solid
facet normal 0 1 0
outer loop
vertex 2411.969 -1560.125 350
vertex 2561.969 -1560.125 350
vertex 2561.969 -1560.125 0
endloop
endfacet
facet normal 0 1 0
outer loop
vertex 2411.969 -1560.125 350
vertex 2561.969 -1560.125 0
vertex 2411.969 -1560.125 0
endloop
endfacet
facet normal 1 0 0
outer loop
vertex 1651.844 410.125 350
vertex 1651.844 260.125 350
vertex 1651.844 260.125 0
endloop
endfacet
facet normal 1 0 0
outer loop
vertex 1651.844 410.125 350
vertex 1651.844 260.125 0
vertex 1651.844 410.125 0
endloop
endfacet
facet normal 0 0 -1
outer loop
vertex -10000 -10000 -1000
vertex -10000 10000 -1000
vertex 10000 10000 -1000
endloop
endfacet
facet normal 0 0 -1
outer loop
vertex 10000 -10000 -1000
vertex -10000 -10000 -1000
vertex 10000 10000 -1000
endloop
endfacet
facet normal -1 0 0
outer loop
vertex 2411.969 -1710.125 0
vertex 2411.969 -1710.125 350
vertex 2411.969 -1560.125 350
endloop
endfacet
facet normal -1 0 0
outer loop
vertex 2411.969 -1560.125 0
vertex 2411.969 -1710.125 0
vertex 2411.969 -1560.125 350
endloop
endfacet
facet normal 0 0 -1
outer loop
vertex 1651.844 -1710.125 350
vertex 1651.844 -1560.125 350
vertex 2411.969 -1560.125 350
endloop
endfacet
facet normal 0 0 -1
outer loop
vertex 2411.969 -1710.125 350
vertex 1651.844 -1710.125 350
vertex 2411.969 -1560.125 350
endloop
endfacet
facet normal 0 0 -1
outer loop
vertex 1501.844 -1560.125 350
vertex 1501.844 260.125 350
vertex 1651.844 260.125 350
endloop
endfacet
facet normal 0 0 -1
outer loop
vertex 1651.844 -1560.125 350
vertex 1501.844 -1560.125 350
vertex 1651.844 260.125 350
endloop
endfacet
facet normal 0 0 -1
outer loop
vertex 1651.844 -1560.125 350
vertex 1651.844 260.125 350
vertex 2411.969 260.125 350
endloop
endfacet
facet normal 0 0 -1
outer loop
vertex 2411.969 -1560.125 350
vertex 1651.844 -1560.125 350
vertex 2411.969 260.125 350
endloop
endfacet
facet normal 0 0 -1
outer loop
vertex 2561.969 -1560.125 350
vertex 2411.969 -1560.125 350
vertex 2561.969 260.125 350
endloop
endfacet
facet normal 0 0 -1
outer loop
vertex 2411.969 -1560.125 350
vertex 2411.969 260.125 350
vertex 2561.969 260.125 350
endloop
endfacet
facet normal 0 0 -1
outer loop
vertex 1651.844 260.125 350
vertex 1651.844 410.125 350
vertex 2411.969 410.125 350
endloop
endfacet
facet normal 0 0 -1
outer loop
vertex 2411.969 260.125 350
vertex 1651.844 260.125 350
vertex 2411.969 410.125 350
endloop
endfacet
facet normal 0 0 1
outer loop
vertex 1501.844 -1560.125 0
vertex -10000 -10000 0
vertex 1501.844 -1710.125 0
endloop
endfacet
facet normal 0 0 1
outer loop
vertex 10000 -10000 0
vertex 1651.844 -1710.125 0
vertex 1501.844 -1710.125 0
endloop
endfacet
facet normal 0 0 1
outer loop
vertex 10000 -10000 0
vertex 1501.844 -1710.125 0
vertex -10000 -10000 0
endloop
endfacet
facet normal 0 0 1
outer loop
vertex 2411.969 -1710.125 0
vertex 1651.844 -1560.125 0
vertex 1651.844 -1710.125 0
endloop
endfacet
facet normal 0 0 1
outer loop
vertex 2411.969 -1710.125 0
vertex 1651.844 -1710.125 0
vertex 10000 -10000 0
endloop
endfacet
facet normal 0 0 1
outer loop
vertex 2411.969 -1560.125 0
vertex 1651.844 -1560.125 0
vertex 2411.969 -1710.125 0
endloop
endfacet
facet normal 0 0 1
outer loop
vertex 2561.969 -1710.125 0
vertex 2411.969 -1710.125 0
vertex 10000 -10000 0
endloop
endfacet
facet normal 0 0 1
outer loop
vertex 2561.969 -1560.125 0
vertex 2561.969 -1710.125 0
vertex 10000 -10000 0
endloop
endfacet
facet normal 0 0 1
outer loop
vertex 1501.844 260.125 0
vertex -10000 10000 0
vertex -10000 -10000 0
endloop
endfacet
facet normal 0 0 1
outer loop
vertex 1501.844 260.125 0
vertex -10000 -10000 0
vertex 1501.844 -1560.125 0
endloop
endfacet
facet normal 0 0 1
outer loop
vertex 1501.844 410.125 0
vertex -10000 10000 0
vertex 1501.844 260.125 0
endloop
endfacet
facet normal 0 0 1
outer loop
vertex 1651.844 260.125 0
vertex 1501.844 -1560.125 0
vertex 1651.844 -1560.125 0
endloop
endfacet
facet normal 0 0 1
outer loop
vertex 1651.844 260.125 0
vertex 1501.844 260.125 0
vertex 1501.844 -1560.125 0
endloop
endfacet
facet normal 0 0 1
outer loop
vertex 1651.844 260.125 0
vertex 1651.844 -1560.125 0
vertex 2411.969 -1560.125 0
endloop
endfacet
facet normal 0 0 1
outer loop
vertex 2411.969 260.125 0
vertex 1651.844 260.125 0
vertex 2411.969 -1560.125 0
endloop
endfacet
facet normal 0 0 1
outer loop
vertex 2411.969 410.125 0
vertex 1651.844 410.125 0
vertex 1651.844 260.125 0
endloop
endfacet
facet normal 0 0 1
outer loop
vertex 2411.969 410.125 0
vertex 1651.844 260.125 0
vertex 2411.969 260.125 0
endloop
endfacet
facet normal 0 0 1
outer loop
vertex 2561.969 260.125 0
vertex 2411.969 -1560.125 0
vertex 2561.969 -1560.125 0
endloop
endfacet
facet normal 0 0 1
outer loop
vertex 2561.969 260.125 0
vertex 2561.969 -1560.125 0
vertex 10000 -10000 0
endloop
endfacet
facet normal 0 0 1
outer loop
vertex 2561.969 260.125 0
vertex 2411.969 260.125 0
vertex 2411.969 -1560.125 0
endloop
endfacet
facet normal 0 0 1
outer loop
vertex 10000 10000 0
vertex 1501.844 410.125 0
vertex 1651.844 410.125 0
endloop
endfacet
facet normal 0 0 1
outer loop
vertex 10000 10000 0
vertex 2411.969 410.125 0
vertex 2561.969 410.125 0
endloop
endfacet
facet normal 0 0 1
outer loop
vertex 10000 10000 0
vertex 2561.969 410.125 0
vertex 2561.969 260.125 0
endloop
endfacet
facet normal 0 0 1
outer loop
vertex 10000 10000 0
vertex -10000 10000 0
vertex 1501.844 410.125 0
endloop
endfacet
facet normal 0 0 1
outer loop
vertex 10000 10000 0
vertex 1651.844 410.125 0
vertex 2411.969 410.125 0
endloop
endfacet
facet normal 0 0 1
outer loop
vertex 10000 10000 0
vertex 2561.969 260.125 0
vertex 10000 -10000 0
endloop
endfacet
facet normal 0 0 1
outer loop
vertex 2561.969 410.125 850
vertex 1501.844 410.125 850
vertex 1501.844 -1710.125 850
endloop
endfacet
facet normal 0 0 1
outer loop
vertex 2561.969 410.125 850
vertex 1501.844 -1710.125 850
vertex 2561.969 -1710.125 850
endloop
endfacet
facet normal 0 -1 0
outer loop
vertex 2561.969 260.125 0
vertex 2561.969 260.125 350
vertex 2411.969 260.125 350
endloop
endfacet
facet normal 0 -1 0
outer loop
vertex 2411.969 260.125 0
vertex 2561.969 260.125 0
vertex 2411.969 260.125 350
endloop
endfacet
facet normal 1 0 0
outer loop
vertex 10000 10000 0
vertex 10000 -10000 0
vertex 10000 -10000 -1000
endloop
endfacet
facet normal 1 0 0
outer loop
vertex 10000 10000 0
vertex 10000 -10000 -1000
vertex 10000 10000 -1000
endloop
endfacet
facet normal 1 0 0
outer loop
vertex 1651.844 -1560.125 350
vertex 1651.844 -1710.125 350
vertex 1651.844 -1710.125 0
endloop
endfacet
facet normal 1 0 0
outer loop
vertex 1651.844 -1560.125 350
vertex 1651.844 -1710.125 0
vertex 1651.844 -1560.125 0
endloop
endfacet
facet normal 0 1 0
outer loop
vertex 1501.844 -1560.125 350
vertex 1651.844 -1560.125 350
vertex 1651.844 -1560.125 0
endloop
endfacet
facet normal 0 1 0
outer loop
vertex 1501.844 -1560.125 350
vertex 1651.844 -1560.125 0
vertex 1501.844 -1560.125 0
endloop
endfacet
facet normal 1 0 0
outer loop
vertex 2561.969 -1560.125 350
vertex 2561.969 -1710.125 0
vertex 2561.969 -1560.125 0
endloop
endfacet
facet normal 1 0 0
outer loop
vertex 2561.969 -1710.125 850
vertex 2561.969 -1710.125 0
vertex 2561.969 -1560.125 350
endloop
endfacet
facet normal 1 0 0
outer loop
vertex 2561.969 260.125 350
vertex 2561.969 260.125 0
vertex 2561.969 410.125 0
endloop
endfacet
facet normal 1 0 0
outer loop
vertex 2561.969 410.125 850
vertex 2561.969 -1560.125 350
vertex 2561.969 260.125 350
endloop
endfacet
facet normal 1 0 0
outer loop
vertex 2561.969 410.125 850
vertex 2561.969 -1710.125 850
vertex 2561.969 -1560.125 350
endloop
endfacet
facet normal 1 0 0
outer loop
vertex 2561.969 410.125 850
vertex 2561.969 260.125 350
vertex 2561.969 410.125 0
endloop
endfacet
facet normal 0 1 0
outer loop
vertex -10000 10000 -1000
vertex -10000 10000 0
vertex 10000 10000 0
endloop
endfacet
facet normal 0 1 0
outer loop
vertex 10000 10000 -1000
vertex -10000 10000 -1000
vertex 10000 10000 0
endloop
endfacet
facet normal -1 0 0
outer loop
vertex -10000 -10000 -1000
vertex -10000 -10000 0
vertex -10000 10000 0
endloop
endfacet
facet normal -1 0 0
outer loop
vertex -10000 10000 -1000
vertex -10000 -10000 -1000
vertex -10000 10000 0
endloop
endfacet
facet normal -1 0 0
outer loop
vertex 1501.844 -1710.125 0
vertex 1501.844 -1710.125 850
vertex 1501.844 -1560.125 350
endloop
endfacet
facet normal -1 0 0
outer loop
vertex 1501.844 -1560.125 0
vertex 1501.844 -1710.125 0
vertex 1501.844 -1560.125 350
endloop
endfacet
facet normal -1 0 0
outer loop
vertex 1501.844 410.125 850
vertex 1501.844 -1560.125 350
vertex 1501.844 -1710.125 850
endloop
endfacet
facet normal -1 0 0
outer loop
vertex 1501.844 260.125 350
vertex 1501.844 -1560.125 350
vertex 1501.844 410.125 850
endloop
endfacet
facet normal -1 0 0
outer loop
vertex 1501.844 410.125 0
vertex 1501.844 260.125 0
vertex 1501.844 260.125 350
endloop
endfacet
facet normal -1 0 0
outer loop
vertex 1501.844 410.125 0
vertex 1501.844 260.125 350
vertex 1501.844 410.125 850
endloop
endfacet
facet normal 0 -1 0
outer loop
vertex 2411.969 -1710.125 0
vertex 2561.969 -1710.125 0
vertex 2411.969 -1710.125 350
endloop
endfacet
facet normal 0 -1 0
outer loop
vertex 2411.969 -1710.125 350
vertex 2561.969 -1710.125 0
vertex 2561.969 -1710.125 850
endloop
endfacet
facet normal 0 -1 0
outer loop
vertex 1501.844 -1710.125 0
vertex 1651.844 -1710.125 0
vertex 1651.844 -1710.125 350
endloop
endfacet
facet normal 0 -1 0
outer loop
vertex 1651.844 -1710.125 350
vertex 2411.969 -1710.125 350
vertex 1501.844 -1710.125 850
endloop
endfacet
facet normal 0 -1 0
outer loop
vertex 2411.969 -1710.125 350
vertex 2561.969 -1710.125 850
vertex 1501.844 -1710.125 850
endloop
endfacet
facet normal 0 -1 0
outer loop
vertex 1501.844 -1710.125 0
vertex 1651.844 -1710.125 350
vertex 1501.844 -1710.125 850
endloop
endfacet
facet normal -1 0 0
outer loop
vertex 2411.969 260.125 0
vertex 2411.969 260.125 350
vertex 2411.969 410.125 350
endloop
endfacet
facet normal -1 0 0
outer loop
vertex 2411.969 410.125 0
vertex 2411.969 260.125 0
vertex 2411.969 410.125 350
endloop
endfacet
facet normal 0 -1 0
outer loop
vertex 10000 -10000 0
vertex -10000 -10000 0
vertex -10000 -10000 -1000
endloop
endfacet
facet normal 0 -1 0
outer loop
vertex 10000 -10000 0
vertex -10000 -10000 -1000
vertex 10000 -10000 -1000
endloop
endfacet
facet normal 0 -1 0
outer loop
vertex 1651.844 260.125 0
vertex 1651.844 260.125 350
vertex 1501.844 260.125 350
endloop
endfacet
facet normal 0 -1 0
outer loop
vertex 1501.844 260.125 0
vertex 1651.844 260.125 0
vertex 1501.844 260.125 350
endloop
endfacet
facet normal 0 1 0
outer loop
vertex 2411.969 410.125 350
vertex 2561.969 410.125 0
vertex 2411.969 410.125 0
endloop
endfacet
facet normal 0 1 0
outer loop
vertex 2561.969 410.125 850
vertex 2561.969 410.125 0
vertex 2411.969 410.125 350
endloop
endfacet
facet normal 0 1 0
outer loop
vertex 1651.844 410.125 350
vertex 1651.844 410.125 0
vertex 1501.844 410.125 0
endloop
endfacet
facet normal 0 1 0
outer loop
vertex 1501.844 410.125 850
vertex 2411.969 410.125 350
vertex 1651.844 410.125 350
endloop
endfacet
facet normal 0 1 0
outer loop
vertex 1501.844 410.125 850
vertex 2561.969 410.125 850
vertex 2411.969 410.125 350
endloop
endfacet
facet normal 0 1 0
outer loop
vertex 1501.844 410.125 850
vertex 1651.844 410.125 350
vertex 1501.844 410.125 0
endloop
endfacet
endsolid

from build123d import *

# Parameters (mm, degrees)
SKETCH2_W           = 20000
SKETCH2_H           = 20000
BOSS_EXTRUDE1_DEPTH = 1000
SKETCH6_W           = 1060.125212232
SKETCH6_H           = 2120.250424464
BOSS_EXTRUDE2_DEPTH = 500
BOSS_EXTRUDE3_REACH = 14208.425
SKETCH7_W           = 150
SKETCH7_H           = 150


with BuildPart() as part:
    # Sketch2 → Boss-Extrude1 (new body)
    with BuildSketch(Plane.XY):
        Rectangle(SKETCH2_W, SKETCH2_H)
    extrude(amount=-BOSS_EXTRUDE1_DEPTH)

    # Sketch7 → Boss-Extrude3 (add, up to next)
    with BuildSketch(Plane(origin=(0, 0, 350), x_dir=(-1, 0, 0), z_dir=(0, 0, -1)), mode=Mode.PRIVATE) as boss_extrude3_sk1:
        with Locations((-2486.969262894, 335.125212232)):
            Rectangle(SKETCH7_W, SKETCH7_H)
    boss_extrude3_tool1 = extrude(boss_extrude3_sk1.sketch, amount=BOSS_EXTRUDE3_REACH, mode=Mode.PRIVATE) - part.part
    # Sketch7 → Boss-Extrude3 (add, up to next)
    with BuildSketch(Plane(origin=(0, 0, 350), x_dir=(-1, 0, 0), z_dir=(0, 0, -1)), mode=Mode.PRIVATE) as boss_extrude3_sk2:
        with Locations((-1576.844050662, 335.125212232)):
            Rectangle(SKETCH7_W, SKETCH7_H)
    boss_extrude3_tool2 = extrude(boss_extrude3_sk2.sketch, amount=BOSS_EXTRUDE3_REACH, mode=Mode.PRIVATE) - part.part
    # Sketch7 → Boss-Extrude3 (add, up to next)
    with BuildSketch(Plane(origin=(0, 0, 350), x_dir=(-1, 0, 0), z_dir=(0, 0, -1)), mode=Mode.PRIVATE) as boss_extrude3_sk3:
        with Locations((-2486.969262894, -1635.125212232)):
            Rectangle(SKETCH7_W, SKETCH7_H)
    boss_extrude3_tool3 = extrude(boss_extrude3_sk3.sketch, amount=BOSS_EXTRUDE3_REACH, mode=Mode.PRIVATE) - part.part
    # Sketch7 → Boss-Extrude3 (add, up to next)
    with BuildSketch(Plane(origin=(0, 0, 350), x_dir=(-1, 0, 0), z_dir=(0, 0, -1)), mode=Mode.PRIVATE) as boss_extrude3_sk4:
        with Locations((-1576.844050662, -1635.125212232)):
            Rectangle(SKETCH7_W, SKETCH7_H)
    boss_extrude3_tool4 = extrude(boss_extrude3_sk4.sketch, amount=BOSS_EXTRUDE3_REACH, mode=Mode.PRIVATE) - part.part


with BuildPart() as body_2:
    # Sketch6 → Boss-Extrude2 (new body)
    with BuildSketch(Plane(origin=(0, -650, 350), x_dir=(1, 0, 0), z_dir=(0, 0, 1))):
        with Locations((2031.906656778, 0)):
            Rectangle(SKETCH6_W, SKETCH6_H)
    extrude(amount=BOSS_EXTRUDE2_DEPTH)


with BuildPart() as part_1:
    add(part.part)

    add(body_2.part)  # Boss-Extrude3 merges body 2
    add(boss_extrude3_tool1.solids().sort_by_distance((2486.969263, 335.125212, 350))[0])
    add(boss_extrude3_tool2.solids().sort_by_distance((1576.844051, 335.125212, 350))[0])
    add(boss_extrude3_tool3.solids().sort_by_distance((2486.969263, -1635.125212, 350))[0])
    add(boss_extrude3_tool4.solids().sort_by_distance((1576.844051, -1635.125212, 350))[0])


solid = part_1.part
